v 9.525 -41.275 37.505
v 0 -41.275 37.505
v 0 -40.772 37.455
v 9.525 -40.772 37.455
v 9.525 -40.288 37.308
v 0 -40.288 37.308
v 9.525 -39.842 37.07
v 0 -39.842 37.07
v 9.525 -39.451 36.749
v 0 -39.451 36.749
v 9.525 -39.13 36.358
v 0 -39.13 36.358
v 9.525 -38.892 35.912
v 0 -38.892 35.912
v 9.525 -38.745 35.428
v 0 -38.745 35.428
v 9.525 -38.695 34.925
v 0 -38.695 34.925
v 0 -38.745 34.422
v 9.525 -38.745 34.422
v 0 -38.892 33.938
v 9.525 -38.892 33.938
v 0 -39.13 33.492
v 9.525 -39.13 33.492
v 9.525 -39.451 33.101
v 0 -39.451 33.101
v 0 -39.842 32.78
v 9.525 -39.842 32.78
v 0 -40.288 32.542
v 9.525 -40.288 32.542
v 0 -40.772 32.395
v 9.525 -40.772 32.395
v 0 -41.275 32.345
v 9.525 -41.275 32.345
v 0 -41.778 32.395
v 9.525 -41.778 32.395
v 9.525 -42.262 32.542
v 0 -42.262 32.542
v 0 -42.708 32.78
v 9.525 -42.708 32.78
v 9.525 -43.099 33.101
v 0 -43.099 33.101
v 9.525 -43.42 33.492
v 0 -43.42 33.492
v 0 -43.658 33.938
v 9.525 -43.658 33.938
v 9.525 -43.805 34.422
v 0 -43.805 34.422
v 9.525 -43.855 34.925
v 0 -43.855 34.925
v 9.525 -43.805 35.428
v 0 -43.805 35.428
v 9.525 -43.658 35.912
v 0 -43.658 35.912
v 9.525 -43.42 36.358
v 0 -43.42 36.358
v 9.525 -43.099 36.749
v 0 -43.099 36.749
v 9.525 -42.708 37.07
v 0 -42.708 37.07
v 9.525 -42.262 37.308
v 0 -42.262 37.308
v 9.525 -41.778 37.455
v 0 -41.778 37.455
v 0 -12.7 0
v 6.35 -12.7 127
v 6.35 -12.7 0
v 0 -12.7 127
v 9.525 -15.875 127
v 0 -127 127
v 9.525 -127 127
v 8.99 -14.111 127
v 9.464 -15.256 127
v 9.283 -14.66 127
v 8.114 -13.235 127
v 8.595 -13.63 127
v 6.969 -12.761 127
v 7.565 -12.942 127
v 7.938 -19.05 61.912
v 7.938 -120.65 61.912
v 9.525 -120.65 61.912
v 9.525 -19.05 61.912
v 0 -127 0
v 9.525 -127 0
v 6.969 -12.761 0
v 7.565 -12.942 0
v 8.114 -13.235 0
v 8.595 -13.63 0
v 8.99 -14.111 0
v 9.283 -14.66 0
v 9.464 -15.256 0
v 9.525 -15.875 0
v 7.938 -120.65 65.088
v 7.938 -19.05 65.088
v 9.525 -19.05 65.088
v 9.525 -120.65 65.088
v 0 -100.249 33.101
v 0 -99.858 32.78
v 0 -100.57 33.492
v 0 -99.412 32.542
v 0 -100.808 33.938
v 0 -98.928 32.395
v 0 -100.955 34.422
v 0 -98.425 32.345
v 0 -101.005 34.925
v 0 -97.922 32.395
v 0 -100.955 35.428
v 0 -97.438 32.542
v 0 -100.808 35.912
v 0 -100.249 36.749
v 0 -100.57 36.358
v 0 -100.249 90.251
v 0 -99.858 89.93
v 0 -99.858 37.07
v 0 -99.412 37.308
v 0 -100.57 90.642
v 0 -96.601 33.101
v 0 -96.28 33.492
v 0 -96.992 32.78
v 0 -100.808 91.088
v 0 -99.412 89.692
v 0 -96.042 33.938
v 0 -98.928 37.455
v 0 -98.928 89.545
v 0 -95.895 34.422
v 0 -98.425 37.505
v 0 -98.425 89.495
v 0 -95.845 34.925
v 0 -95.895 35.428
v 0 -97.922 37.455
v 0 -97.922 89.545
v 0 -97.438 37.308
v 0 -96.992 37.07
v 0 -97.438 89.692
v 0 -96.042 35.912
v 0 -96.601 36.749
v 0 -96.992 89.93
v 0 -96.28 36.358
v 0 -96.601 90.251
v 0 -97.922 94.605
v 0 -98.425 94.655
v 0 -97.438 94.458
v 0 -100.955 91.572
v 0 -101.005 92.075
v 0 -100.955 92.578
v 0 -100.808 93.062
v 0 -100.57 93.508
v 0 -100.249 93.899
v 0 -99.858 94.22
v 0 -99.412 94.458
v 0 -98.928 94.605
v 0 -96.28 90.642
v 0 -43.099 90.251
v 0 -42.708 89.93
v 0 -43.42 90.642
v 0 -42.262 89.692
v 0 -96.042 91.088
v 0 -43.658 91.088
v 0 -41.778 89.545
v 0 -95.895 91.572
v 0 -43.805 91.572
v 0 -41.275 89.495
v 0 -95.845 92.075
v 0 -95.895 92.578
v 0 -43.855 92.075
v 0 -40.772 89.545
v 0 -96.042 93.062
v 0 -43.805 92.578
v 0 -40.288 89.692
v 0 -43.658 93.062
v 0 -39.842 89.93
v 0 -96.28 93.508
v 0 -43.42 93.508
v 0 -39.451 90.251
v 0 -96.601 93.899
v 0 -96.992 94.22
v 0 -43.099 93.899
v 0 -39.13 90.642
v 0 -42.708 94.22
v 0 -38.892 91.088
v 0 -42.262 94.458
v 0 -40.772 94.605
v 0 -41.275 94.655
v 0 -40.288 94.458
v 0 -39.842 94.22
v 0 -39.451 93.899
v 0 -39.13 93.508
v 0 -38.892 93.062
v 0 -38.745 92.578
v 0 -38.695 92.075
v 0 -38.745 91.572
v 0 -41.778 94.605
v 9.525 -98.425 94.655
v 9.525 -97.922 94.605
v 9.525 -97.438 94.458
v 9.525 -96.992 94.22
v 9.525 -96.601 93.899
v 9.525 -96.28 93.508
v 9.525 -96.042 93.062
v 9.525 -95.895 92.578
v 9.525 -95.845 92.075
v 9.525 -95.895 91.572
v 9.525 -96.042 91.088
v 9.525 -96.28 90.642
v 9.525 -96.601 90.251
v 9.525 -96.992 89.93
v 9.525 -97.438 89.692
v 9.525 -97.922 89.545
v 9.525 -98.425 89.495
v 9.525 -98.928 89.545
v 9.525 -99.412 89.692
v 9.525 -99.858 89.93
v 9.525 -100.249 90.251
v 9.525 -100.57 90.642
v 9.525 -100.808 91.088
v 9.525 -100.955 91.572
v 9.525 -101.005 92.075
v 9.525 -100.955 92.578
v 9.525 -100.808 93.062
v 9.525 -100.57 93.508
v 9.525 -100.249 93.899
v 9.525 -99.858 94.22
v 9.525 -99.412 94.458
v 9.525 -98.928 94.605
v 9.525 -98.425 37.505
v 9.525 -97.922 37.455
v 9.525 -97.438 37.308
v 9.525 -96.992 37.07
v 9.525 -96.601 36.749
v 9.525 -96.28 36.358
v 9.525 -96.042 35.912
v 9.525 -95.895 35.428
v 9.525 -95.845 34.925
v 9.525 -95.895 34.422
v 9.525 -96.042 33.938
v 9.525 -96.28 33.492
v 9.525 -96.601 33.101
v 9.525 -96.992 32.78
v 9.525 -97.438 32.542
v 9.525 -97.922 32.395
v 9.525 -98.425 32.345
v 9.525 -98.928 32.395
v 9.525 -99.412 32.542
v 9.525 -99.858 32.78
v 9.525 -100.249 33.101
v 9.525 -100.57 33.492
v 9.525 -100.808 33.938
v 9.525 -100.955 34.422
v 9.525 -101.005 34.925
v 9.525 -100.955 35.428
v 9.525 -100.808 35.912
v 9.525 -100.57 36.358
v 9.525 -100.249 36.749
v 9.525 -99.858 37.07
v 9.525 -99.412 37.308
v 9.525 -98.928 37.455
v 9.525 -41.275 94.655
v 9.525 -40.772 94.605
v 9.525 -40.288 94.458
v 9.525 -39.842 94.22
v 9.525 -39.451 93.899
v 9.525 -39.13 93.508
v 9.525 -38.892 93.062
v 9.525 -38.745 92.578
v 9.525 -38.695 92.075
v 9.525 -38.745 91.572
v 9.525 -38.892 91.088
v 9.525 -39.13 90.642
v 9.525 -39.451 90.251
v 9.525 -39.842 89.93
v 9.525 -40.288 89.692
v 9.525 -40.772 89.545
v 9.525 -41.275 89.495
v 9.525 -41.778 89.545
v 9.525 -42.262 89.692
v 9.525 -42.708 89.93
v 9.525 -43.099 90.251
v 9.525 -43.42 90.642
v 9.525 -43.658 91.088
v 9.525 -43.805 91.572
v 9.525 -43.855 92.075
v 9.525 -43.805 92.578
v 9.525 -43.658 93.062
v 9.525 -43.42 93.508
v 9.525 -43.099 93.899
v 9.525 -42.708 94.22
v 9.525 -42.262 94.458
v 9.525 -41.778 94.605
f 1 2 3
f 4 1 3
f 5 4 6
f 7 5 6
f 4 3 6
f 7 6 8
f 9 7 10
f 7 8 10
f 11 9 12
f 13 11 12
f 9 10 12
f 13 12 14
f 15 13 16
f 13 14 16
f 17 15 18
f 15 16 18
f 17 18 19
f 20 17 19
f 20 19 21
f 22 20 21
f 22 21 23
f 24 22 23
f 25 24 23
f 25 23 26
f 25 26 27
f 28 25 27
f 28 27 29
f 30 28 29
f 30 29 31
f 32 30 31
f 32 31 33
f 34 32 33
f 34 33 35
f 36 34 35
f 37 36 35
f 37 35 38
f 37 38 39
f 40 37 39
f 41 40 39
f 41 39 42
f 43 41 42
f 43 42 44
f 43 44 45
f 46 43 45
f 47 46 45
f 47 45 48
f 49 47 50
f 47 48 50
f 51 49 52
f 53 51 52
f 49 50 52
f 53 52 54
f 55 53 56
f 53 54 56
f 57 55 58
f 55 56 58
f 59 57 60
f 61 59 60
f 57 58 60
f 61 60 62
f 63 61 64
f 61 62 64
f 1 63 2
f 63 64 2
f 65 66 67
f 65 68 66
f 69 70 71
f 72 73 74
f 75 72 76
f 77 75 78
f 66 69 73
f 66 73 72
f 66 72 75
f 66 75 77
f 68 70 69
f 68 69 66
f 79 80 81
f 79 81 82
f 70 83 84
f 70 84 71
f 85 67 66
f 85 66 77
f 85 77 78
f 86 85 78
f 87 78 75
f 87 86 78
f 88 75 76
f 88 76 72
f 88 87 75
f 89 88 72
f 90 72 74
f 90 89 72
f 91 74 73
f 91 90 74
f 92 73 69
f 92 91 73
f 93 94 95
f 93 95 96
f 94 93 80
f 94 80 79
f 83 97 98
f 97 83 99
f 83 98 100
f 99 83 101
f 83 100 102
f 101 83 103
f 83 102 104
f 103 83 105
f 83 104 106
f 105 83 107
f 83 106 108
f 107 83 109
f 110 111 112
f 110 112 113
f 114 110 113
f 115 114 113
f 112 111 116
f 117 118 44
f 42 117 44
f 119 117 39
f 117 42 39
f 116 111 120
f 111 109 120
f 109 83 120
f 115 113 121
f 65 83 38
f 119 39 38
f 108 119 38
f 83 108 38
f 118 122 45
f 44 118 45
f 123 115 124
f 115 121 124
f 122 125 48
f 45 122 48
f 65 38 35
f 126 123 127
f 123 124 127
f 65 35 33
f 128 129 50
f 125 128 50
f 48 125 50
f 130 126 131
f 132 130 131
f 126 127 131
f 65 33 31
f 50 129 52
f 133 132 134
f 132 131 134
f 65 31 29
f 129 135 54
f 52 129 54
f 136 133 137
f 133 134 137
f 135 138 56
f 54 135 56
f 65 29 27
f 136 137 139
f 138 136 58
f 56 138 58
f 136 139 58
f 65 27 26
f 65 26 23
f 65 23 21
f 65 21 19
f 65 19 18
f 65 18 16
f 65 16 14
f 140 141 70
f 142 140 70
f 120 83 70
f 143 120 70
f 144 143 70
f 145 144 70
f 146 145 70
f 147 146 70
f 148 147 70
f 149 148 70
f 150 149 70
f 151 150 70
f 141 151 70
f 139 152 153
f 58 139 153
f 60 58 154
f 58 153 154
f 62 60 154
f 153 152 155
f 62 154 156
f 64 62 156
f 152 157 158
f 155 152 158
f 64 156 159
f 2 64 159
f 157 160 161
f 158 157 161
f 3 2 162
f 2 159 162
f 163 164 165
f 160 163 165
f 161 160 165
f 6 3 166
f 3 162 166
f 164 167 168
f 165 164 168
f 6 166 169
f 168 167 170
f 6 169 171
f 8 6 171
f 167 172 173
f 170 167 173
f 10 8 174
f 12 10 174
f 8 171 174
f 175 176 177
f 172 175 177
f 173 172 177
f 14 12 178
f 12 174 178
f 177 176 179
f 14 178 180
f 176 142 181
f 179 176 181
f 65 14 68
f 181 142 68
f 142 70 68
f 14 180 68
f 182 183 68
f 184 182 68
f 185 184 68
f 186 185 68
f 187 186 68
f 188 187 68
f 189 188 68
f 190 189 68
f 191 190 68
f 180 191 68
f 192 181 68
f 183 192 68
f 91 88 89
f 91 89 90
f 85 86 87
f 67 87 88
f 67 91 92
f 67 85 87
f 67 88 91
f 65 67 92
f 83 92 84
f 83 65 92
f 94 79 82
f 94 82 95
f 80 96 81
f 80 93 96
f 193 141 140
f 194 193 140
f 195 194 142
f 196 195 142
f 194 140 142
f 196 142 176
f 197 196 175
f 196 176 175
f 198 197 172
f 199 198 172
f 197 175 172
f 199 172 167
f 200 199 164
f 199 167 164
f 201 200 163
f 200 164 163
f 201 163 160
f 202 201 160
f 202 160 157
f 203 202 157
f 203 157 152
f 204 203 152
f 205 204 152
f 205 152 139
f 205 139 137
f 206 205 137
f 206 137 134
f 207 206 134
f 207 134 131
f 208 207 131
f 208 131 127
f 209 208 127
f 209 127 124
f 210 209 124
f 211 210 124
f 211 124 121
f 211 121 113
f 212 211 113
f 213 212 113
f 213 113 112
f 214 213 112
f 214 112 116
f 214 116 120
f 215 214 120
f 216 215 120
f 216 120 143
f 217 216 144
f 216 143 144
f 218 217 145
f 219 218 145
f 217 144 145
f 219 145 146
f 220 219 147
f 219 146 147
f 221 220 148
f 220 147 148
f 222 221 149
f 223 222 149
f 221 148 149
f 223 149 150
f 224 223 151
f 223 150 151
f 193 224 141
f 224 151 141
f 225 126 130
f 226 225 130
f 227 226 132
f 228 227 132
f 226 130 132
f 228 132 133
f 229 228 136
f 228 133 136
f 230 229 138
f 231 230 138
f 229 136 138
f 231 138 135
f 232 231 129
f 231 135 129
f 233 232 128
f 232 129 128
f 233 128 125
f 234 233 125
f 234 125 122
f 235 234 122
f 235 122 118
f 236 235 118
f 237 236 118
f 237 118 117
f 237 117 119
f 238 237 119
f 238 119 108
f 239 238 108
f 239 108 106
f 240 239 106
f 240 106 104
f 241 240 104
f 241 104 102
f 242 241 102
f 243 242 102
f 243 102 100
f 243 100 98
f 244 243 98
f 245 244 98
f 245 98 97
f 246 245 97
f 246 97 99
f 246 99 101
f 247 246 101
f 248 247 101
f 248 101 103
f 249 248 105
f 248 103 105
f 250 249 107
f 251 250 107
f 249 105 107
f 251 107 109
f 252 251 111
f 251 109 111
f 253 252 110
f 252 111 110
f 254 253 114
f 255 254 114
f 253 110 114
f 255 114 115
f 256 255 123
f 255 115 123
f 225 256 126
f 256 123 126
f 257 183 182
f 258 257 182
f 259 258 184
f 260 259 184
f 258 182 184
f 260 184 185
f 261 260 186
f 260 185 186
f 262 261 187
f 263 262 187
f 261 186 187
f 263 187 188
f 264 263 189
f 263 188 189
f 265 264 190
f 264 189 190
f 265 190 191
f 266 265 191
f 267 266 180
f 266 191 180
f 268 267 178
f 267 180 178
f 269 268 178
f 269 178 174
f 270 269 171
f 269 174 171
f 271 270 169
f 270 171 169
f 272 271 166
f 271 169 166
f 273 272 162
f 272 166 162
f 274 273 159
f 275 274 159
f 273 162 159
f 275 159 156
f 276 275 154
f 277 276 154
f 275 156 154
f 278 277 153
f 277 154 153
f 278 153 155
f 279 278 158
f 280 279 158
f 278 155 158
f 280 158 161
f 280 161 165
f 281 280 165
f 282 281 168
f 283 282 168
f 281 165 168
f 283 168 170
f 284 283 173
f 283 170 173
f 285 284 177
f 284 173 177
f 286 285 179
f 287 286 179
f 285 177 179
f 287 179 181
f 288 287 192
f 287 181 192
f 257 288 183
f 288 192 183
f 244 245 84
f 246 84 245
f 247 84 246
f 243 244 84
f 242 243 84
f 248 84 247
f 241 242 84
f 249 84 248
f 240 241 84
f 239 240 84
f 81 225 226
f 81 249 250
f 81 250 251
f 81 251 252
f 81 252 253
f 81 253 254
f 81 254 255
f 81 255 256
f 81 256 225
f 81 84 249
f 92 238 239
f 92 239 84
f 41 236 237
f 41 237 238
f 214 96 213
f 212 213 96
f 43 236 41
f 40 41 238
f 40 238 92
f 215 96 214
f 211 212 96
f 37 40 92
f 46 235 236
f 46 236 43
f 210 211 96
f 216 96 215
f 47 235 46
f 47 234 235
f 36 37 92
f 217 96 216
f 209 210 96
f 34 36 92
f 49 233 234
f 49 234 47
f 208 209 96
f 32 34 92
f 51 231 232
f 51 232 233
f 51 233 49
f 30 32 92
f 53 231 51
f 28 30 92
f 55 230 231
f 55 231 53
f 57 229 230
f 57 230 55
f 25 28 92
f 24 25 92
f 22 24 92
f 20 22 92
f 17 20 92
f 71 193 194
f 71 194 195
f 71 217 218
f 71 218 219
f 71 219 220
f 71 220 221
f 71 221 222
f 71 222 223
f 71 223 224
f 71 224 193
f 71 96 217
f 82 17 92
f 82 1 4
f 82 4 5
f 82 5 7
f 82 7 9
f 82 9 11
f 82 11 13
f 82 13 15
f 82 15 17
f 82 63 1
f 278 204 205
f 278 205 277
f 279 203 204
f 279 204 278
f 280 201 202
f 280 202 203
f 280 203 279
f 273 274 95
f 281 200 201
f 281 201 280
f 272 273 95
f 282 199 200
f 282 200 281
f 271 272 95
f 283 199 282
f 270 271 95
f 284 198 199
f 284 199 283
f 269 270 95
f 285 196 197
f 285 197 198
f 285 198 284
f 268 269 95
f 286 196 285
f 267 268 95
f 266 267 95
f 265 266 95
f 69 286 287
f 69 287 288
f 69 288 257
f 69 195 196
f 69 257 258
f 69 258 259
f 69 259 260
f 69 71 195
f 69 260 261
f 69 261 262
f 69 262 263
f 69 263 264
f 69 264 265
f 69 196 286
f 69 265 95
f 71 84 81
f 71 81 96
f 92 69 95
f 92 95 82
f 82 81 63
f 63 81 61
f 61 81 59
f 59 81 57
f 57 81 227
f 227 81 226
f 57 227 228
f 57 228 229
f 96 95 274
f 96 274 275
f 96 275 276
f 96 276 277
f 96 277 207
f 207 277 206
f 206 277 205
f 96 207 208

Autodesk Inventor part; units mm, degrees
ref_plane "YZ Plane" through (0, 0, 0) normal (1, 0, 0) x (0, 1, 0)
ref_plane "XZ Plane" through (0, 0, 0) normal (0, 1, 0) x (-1, 0, 0)
ref_plane "XY Plane" through (0, 0, 0) normal (0, 0, 1) x (1, 0, 0)
sketch "Sketch1" plane through (0, 0, 0) normal (1, 0, 0) x (0, 1, 0)
  line L0 (0, 0) -> (-127, 0)
  line L1 (-127, 0) -> (-127, 127)
  line L2 (-127, 127) -> (0, 127)
  line L3 (0, 127) -> (0, 0)
  line L4 (-19.05, 65.0875) -> (-120.65, 65.0875)
  line L5 (-120.65, 65.0875) -> (-120.65, 61.9125)
  line L6 (-120.65, 61.9125) -> (-19.05, 61.9125)
  line L7 (-19.05, 61.9125) -> (-19.05, 65.0875)
  line L8 (0, 47.625) -> (-12.7, 47.625)
  line L9 (-12.7, 47.625) -> (-12.7, 79.375)
  line L10 (-12.7, 79.375) -> (0, 79.375)
  line L11 (0, 79.375) -> (0, 47.625)
  line L12 (-12.7, 47.625) -> (-12.7, 0)
  line L13 (-12.7, 79.375) -> (-12.7, 127)
  dimension "d0" = 127
  dimension "d1" = 127
  dimension "d2" = 6.35
  dimension "d4" = 3.175
  dimension "d5" = 61.9125
  dimension "d25" = 12.7
  dimension "d26" = 31.75
  dimension "d27" = 47.625
  dimension "d28" = 6.35
extrude "Extrusion1" add sketch "Sketch1" along normal blind 9.525 contours L0 L1 L2 L13 L9 L12
extrude "Extrusion2" add sketch "Sketch1" along normal blind 7.9375 contours L7 L6 L5 L4
sketch "Sketch3" plane through (0, 0, 0) normal (-1, 0, 0) x (0, 0, 1)
  circle A0 centre (34.925, -41.275) radius 2.5797
  line L0 (0, -127) -> (0, -12.7) projected
  line L1 (0, -12.7) -> (0, 0)
  line L2 (0, 0) -> (20.4302, 0)
  line L3 (20.4302, 0) -> (0, -12.7)
  circle A1 centre (34.925, -98.425) radius 2.5797
  circle A2 centre (92.075, -41.275) radius 2.5797
  circle A3 centre (92.075, -98.425) radius 2.5797
  line L4 (0, -12.7) -> (127, -12.7) projected
  dimension "d31" = 57.15
  dimension "d34" = 57.15
  dimension "d37" = 34.925
  dimension "d38" = 28.575
  dimension "d39" = 5.1594
extrude "Extrusion4" cut sketch "Sketch3" against normal through all contours A0 | A1 | A2 | A3
fillet "Fillet5" radius 3.175 1 edges at (9.525, -12.7, 63.5)
equation "\"d5\" = -0.5 * d4 + 0.5 * d1"
equation "\"d27\" = -0.5 * d26 + 0.5 * d1"
equation "\"d28\" = d2"
properties part number "Gripper plate"
